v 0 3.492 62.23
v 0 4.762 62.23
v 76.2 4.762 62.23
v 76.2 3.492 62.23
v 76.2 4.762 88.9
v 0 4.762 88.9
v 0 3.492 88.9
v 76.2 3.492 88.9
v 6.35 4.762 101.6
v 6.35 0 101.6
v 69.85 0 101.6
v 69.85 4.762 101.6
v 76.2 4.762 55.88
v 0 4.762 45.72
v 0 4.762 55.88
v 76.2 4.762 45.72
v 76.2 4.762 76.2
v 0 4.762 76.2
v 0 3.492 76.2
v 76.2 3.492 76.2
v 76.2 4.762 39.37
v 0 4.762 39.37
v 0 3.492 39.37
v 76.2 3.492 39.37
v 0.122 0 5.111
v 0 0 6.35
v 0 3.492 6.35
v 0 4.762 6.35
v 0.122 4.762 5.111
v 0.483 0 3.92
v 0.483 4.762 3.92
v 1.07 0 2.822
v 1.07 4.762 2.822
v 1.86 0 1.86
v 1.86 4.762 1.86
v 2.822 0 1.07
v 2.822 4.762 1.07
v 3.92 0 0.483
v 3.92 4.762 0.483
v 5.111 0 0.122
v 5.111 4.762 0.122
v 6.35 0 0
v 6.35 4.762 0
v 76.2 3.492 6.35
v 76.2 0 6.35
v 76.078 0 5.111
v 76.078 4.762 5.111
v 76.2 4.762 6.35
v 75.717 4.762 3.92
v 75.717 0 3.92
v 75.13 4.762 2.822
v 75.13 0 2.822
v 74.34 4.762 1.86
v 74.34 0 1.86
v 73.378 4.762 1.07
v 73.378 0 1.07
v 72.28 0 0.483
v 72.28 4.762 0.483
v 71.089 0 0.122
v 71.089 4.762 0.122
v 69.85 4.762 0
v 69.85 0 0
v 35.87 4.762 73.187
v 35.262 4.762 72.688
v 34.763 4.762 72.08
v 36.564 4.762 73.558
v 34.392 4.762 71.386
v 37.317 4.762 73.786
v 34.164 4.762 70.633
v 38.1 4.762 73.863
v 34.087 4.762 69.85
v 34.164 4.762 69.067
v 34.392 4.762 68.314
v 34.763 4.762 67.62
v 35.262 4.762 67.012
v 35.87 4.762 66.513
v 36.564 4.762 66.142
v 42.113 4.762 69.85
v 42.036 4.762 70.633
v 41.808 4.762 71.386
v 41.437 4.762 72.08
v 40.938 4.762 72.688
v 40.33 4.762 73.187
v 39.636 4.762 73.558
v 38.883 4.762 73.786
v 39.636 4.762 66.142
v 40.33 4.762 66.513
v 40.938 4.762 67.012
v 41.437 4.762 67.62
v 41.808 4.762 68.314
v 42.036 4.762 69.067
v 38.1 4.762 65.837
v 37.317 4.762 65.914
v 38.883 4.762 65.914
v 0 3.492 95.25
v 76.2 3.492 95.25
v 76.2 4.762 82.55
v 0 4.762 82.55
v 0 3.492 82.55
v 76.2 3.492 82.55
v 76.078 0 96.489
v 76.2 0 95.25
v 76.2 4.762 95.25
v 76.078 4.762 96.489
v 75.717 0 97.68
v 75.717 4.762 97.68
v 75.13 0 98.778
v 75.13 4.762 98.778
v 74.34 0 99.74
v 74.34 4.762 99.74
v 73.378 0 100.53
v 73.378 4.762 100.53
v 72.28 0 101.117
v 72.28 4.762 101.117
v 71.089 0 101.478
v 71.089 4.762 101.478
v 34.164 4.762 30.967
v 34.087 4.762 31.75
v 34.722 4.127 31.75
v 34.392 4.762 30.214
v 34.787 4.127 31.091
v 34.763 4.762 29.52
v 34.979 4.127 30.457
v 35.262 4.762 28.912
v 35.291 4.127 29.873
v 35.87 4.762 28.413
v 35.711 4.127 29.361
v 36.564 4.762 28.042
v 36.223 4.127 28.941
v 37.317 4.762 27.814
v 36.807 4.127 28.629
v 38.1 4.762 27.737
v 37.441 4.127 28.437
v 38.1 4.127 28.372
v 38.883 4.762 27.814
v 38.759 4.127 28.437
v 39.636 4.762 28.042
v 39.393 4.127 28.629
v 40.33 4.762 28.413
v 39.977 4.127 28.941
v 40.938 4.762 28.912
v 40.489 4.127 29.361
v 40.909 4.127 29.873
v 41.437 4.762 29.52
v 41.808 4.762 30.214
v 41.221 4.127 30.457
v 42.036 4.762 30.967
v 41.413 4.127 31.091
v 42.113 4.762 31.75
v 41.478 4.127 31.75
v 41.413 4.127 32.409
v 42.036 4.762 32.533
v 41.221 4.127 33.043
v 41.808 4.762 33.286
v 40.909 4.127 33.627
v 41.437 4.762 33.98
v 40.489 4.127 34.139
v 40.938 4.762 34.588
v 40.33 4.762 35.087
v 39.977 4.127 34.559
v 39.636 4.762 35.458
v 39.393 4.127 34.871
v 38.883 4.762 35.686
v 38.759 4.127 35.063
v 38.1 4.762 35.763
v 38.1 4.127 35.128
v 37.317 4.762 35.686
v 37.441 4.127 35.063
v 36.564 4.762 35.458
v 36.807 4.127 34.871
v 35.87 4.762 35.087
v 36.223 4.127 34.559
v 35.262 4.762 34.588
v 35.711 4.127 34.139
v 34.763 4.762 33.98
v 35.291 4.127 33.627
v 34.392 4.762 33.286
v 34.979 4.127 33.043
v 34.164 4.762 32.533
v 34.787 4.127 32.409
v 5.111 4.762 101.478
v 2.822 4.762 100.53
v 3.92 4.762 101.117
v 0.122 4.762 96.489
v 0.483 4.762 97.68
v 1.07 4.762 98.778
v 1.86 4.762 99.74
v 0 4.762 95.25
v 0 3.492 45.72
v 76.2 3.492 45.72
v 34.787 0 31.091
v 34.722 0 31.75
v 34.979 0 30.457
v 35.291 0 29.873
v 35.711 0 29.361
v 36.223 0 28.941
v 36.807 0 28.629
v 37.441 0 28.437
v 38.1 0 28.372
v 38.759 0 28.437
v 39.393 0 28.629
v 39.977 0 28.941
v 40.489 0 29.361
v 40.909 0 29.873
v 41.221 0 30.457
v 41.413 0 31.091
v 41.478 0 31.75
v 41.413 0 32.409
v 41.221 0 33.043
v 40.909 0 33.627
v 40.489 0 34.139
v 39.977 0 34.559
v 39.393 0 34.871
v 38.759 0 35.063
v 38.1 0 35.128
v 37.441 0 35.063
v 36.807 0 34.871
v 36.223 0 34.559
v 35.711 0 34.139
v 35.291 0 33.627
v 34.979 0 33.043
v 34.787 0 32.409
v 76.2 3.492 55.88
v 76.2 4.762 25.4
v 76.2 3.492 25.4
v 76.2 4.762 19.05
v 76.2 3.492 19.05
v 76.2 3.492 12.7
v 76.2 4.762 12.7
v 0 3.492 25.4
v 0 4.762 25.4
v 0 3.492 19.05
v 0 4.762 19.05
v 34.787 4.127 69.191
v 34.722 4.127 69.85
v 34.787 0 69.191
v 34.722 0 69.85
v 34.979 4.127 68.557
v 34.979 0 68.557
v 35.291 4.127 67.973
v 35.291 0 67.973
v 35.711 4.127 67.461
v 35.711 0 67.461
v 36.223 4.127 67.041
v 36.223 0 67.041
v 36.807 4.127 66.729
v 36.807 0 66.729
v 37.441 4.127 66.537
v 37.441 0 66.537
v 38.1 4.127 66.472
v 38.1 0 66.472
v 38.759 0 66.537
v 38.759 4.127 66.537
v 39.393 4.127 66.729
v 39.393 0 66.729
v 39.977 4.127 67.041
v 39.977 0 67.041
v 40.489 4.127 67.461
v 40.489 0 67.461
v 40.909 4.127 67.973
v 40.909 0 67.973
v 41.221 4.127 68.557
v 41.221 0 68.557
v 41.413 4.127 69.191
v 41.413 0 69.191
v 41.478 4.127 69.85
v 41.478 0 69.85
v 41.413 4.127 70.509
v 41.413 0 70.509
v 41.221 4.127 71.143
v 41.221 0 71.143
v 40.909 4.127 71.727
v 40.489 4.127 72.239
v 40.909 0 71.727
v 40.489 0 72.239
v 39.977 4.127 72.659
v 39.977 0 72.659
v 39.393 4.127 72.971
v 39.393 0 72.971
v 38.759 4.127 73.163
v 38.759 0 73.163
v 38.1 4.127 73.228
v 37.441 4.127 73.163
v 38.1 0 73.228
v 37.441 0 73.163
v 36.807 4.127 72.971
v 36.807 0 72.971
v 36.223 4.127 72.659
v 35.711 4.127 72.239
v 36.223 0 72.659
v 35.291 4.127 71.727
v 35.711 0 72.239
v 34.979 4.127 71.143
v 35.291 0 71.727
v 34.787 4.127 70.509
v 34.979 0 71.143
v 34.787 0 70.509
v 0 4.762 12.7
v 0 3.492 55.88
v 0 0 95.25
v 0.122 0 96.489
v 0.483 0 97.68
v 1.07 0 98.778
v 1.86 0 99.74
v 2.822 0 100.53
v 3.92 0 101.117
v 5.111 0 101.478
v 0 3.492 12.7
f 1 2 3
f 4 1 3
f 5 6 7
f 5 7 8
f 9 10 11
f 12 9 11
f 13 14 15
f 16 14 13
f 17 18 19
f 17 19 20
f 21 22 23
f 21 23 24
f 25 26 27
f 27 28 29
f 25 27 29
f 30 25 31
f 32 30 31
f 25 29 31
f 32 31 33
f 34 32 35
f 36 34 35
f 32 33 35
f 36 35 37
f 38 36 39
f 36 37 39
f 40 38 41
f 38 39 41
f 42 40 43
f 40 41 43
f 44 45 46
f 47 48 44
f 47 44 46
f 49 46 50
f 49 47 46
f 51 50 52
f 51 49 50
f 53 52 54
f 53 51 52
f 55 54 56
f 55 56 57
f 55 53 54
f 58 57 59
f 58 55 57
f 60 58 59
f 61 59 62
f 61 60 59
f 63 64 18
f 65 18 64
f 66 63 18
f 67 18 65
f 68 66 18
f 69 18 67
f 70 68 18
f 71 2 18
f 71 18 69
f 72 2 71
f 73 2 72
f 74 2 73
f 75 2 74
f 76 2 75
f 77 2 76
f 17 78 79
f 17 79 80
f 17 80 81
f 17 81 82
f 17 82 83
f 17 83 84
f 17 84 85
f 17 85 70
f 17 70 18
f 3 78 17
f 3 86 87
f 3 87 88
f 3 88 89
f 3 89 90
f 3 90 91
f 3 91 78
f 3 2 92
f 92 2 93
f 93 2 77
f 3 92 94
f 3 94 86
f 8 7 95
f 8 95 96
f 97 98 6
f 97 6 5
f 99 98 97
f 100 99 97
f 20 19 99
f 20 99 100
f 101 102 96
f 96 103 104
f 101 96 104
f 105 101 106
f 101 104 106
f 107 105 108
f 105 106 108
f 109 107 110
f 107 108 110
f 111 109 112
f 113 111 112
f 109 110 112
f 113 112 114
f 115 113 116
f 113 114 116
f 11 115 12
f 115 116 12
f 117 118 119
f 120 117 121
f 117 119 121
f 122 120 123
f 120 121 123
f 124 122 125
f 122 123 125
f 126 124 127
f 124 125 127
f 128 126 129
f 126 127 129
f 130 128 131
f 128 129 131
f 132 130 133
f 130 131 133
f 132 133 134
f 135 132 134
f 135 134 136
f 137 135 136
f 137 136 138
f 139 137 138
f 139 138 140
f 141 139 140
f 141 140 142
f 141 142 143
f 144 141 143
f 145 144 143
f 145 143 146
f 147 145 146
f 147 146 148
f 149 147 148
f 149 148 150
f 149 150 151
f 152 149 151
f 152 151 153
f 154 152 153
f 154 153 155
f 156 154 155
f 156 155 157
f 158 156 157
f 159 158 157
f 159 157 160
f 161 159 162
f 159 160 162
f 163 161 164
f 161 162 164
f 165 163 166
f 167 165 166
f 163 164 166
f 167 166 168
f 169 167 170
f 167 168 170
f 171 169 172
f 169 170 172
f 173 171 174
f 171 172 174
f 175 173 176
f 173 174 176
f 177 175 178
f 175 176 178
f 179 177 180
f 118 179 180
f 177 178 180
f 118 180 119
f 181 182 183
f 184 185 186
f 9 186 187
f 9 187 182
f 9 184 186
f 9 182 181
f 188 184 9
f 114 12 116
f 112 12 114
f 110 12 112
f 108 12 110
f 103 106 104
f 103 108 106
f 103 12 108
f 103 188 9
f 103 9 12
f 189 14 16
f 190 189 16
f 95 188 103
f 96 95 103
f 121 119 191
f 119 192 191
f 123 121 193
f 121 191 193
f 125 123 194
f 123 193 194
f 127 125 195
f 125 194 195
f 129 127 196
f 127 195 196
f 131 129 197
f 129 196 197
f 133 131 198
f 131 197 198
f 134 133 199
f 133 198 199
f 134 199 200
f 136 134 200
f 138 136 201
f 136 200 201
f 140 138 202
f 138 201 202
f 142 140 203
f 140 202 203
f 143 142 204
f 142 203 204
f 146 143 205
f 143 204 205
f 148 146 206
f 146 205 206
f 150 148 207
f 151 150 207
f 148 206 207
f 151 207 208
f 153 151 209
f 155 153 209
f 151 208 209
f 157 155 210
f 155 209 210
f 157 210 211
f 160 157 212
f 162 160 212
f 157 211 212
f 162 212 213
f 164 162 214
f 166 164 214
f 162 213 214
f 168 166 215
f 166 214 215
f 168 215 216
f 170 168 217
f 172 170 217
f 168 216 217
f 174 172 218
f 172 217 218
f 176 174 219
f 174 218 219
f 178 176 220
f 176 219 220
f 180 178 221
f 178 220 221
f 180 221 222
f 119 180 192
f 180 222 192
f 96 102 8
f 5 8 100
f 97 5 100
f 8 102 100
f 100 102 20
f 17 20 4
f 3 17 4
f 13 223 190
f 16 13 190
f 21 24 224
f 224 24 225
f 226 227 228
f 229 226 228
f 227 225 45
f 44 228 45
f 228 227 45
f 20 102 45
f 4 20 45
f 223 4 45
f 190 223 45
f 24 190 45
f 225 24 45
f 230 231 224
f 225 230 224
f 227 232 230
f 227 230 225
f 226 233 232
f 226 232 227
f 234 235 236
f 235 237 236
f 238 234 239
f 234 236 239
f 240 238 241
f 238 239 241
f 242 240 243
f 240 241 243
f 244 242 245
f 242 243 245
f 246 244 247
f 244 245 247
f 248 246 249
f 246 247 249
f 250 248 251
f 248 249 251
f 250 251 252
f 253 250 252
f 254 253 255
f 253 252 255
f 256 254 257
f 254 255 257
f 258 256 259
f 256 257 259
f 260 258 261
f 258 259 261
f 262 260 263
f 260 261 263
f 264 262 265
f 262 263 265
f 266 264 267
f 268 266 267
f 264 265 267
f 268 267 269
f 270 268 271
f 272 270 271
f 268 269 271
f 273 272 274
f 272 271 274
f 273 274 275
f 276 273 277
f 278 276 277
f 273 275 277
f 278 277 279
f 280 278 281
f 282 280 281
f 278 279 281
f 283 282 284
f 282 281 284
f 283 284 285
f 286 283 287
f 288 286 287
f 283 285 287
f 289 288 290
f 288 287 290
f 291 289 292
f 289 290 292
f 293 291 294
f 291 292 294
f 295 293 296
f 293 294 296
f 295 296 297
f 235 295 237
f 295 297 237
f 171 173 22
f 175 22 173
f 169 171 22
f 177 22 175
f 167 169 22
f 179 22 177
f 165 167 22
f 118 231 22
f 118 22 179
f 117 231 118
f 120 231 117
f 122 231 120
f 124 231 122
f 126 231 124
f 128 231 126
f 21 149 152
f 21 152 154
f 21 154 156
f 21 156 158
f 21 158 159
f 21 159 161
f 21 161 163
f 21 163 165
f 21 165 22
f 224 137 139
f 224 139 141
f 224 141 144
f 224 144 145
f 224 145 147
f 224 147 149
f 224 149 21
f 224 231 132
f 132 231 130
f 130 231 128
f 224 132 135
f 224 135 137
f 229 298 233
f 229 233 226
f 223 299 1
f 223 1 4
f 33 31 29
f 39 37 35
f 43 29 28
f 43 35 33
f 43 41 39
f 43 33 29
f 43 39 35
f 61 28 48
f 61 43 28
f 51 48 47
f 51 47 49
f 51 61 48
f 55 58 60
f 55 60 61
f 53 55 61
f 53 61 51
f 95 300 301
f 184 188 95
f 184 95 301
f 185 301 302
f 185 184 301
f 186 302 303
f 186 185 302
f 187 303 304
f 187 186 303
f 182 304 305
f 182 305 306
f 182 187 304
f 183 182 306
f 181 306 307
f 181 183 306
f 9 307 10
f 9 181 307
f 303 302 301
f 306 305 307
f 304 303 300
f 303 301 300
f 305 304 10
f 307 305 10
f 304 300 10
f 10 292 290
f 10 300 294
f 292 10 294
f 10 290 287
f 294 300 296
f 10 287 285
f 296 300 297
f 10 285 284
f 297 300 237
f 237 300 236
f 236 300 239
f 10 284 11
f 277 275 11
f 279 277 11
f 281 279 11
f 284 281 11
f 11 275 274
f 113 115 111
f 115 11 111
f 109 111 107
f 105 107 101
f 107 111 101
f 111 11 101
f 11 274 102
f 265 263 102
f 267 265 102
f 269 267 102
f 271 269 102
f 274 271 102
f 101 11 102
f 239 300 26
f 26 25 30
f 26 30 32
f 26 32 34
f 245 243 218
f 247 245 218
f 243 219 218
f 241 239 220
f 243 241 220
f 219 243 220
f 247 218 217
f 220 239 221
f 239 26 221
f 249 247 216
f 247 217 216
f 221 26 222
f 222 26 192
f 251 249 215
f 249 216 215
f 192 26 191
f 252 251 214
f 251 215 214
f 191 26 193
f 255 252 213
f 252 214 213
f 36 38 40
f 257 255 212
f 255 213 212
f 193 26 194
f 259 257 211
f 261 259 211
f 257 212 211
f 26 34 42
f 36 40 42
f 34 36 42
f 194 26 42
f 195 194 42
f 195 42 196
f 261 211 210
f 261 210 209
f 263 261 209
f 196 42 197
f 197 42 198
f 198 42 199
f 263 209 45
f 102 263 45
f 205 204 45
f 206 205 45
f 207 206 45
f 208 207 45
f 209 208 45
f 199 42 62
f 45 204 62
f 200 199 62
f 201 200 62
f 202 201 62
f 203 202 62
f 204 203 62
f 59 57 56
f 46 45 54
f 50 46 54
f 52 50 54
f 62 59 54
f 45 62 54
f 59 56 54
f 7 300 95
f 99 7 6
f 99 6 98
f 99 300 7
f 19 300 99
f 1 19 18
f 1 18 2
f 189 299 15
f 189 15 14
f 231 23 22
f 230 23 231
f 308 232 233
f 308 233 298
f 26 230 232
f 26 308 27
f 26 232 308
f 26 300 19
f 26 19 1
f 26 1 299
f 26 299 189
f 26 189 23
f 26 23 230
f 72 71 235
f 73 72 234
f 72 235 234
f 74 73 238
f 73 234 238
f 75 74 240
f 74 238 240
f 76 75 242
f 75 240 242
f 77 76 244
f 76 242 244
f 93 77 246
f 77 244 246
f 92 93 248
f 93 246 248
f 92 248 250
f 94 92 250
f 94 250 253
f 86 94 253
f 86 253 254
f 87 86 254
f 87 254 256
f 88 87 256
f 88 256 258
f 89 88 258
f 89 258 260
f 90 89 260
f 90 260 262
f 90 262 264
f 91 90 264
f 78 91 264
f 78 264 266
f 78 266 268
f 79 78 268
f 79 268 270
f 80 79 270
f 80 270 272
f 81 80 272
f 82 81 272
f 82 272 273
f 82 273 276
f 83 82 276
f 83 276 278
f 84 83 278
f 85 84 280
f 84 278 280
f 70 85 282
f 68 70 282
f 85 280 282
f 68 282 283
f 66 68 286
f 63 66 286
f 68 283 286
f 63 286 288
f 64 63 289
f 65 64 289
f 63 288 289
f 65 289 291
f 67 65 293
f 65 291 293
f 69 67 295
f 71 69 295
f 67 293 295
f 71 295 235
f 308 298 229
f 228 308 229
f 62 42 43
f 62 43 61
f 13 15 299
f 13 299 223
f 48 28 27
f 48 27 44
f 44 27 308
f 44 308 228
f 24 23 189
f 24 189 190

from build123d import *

# Parameters (mm, degrees)
SKETCH1_W                         = 76.2
SKETCH1_H                         = 101.6
BOSS_EXTRUDE1_DEPTH               = 4.7625
F_1_4_CLEARANCE_HOLE1_D           = 6.7564
F_1_4_CLEARANCE_HOLE1_CSINK_D     = 8.0264
F_1_4_CLEARANCE_HOLE1_CSINK_ANGLE = 90
FILLET1_R                         = 6.35
SKETCH7_W                         = 76.2
SKETCH7_H                         = 6.35
CUT_EXTRUDE1_DEPTH                = 1.27


with BuildPart() as part:
    # Sketch1 → Boss-Extrude1 (new body)
    with BuildSketch(Plane(origin=(0, 0, 0), x_dir=(1, 0, 0), z_dir=(0, 1, 0))):
        with Locations((38.1, -50.8)):
            Rectangle(SKETCH1_W, SKETCH1_H)
    extrude(amount=BOSS_EXTRUDE1_DEPTH)

    # 1/4 Clearance Hole1 (through all)
    with Locations(Plane(origin=(0, 4.7625, 0), x_dir=(1, 0, 0), z_dir=(0, 1, 0))):
        with Locations((38.1, -69.85), (38.1, -31.75)):
            CounterSinkHole(F_1_4_CLEARANCE_HOLE1_D / 2, F_1_4_CLEARANCE_HOLE1_CSINK_D / 2, counter_sink_angle=F_1_4_CLEARANCE_HOLE1_CSINK_ANGLE)

    # Fillet1
    fillet1_edges = [part.edges().sort_by_distance(p)[0] for p in [
        (0, 2.38125, 0),
        (76.2, 2.38125, 0),
        (76.2, 2.38125, 101.6),
        (0, 2.38125, 101.6),
    ]]
    fillet(fillet1_edges, radius=FILLET1_R)

    # Sketch7 → Cut-Extrude1 (cut)
    with BuildSketch(Plane(origin=(0, 4.7625, 0), x_dir=(1, 0, 0), z_dir=(0, 1, 0))):
        with Locations((38.1, -9.525)):
            Rectangle(SKETCH7_W, SKETCH7_H)
        with Locations((38.1, -42.545)):
            Rectangle(SKETCH7_W, SKETCH7_H)
        with Locations((38.1, -59.055)):
            Rectangle(SKETCH7_W, SKETCH7_H)
        with Locations((38.1, -92.075)):
            Rectangle(SKETCH7_W, SKETCH7_H)
        with Locations((38.1, -79.375)):
            Rectangle(SKETCH7_W, SKETCH7_H)
        with Locations((38.1, -22.225)):
            Rectangle(SKETCH7_W, SKETCH7_H)
    extrude(amount=-CUT_EXTRUDE1_DEPTH, mode=Mode.SUBTRACT)


solid = part.part
